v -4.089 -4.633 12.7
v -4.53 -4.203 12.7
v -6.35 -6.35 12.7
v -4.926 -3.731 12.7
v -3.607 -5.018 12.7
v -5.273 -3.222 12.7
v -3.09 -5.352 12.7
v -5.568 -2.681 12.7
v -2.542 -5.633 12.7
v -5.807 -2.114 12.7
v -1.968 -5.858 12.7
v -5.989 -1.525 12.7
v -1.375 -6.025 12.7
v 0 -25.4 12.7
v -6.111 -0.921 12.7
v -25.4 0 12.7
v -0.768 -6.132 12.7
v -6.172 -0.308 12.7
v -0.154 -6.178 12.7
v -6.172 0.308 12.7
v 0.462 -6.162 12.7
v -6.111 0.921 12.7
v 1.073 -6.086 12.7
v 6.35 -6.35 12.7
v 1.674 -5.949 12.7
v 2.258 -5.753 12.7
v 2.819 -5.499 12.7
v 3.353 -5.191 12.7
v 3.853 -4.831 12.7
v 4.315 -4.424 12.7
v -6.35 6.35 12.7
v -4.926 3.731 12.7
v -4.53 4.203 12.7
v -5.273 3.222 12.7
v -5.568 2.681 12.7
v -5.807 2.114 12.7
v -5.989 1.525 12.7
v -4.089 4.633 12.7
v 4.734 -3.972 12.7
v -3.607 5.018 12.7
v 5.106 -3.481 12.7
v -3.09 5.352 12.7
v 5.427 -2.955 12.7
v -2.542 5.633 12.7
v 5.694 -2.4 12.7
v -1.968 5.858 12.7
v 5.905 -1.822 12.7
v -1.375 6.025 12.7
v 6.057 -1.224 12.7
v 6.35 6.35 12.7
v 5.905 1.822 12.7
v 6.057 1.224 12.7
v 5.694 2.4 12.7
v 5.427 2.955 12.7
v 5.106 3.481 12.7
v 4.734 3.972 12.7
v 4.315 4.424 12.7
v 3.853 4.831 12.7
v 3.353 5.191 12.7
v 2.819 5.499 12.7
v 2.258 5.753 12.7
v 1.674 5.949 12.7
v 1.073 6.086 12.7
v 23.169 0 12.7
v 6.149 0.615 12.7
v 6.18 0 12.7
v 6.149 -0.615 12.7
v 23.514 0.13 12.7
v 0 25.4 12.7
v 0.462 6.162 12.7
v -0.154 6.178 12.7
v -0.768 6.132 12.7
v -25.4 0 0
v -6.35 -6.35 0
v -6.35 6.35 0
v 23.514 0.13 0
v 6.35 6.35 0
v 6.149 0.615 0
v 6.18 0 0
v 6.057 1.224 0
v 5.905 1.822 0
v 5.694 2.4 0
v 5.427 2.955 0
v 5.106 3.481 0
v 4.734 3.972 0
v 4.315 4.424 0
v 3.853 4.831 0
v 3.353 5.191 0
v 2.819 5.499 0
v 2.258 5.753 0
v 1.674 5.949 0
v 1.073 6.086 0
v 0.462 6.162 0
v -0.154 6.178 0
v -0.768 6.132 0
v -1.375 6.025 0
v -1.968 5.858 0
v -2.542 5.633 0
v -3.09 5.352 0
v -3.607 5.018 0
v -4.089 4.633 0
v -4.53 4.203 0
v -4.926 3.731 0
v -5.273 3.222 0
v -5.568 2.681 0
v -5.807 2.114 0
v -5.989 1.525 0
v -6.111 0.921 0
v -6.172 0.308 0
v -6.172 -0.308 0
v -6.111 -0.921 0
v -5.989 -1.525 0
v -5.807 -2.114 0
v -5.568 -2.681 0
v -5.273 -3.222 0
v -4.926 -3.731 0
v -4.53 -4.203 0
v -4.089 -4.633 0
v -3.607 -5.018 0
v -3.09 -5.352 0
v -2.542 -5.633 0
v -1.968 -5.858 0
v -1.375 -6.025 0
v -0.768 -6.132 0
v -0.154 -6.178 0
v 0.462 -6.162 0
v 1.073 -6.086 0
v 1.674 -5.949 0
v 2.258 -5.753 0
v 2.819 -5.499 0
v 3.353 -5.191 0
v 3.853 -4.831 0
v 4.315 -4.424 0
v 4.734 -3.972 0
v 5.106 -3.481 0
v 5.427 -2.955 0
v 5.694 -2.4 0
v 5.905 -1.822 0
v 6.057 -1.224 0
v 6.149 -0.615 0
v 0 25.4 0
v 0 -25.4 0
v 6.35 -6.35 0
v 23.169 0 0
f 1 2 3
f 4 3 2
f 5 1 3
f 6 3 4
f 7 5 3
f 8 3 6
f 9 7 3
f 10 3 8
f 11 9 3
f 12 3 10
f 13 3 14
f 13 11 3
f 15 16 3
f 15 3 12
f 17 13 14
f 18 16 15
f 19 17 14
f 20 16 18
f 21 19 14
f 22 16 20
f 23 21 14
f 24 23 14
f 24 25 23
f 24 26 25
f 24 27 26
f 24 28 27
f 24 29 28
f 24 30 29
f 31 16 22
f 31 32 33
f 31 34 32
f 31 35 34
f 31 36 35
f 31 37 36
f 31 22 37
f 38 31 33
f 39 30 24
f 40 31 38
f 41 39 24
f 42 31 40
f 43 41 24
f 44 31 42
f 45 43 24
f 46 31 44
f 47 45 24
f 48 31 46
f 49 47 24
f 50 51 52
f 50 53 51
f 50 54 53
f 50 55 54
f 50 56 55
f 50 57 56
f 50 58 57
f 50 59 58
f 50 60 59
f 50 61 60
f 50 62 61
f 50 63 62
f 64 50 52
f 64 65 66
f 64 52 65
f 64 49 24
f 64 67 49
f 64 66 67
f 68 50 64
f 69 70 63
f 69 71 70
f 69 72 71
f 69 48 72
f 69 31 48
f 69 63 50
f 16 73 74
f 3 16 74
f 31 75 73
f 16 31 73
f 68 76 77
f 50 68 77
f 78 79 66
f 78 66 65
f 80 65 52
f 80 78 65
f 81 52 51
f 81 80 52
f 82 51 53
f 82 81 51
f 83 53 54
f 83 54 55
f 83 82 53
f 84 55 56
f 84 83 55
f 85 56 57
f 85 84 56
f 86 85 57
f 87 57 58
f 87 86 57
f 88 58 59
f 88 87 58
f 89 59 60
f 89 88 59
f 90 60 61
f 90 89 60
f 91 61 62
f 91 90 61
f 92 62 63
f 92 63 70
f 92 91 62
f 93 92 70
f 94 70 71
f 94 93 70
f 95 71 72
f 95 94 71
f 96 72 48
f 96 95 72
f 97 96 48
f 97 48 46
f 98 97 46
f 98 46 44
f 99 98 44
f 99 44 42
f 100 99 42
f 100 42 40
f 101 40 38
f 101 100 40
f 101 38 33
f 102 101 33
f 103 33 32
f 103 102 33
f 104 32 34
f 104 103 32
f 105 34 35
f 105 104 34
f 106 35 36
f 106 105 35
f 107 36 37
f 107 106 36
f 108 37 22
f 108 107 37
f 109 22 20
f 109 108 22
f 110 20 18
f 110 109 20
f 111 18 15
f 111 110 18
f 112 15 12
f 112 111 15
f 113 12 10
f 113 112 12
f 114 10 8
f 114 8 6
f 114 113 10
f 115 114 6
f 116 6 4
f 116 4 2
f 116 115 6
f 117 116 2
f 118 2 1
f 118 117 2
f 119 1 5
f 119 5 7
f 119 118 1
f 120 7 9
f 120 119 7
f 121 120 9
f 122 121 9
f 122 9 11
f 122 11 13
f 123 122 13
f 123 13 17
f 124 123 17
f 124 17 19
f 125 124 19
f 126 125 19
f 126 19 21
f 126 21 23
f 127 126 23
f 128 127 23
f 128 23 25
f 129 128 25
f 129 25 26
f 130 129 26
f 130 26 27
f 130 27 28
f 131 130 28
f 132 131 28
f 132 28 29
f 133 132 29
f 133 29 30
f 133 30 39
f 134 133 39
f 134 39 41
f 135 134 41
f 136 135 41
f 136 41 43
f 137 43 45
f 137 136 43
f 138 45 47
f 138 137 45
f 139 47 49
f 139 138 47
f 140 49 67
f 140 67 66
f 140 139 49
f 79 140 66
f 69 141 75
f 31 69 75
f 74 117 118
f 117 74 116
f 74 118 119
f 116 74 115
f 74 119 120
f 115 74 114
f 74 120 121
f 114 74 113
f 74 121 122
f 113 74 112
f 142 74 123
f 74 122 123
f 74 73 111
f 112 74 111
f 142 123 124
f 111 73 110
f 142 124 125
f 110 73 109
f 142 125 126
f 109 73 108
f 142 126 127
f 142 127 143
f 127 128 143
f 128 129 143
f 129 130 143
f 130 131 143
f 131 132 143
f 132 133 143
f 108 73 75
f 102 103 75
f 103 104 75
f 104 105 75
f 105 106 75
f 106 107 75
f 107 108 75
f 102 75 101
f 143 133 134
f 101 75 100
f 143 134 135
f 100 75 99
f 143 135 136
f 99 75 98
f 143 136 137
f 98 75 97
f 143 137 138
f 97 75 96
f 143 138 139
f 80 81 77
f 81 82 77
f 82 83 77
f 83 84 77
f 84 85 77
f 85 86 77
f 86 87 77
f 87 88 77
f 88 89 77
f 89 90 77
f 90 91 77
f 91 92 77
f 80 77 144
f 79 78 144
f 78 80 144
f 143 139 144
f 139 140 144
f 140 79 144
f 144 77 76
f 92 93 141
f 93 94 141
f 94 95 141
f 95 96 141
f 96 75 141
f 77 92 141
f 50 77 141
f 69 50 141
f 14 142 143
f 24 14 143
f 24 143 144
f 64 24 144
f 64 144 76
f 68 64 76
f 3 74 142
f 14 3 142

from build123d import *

# Parameters (mm, degrees)
F0_R     = 6.179709
F1_DEPTH = 12.7


with BuildPart() as f1:
    # F0 (on Top) → F1 (new body)
    with BuildSketch(Plane.XY):
        Polygon((6.35, -6.35), (23.169448, 0), (23.514125, 0.130129), (6.35, 6.35), (0, 25.4), (-6.35, 6.35), (-25.4, 0), (-6.35, -6.35), (0, -25.4), align=None)
        Circle(F0_R, mode=Mode.SUBTRACT)
    extrude(amount=F1_DEPTH)


solid = f1.part
